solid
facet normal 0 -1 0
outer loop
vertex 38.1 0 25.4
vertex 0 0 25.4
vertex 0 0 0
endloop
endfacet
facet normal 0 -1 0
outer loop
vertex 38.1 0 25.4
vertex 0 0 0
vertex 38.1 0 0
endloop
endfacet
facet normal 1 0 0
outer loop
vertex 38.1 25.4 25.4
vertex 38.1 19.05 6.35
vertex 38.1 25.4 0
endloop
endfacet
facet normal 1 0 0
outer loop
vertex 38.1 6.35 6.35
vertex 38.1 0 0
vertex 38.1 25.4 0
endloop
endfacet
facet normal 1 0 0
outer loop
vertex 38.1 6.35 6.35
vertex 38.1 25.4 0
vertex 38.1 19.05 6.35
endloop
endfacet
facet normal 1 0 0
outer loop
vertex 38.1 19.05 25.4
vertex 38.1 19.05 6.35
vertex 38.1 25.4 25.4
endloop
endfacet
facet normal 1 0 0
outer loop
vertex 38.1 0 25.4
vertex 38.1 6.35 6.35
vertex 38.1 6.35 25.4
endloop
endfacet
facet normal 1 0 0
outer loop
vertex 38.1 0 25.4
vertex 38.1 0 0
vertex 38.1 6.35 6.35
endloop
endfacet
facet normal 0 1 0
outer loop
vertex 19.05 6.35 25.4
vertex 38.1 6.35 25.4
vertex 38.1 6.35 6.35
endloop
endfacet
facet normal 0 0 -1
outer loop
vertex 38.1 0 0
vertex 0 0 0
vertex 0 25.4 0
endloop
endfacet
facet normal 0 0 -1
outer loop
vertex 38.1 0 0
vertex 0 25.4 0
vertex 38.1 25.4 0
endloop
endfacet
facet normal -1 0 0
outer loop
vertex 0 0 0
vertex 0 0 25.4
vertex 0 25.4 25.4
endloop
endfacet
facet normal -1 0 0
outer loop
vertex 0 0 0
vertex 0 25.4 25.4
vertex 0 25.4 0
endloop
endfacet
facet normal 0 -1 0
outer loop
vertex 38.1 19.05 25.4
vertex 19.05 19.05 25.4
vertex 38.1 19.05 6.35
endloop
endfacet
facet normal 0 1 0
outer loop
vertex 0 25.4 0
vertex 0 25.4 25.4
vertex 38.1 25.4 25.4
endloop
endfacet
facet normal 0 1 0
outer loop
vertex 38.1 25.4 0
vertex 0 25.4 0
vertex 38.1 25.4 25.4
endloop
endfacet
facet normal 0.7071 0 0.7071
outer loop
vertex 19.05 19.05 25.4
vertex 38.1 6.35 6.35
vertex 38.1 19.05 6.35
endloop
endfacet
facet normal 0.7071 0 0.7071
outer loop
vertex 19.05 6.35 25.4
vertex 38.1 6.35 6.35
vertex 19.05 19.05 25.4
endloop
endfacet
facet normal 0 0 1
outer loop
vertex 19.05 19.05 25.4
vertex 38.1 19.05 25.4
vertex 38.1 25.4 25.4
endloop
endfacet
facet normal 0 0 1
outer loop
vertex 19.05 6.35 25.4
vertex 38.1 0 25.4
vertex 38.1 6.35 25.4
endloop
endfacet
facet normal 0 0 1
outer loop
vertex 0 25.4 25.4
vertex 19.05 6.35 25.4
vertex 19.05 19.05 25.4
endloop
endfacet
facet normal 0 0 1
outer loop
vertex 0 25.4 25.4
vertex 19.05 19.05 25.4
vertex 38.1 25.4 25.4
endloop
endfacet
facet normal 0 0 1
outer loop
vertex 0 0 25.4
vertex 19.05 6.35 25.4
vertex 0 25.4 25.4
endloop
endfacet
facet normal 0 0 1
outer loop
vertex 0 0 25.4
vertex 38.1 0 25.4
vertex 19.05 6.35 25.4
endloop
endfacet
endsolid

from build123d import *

# Parameters (mm, degrees)
F2_DEPTH = 25.4
F4_DEPTH = 25.4


with BuildPart() as f2:
    # F0 (on Front) → F2 (new body)
    with BuildSketch(Plane.XZ):
        Polygon((0, 25.4), (0, 0), (38.1, 0), (38.1, 6.35), (19.05, 25.4), align=None)
    extrude(amount=-F2_DEPTH)

    # F3 (on Top) → F4 (join)
    with BuildSketch(Plane.XY):
        Polygon((0, 25.4), (0, 0), (38.1, 0), (38.1, 6.35), (19.05, 6.35), (19.05, 19.05), (38.1, 19.05), (38.1, 25.4), align=None)
    extrude(amount=F4_DEPTH)


solid = f2.part
